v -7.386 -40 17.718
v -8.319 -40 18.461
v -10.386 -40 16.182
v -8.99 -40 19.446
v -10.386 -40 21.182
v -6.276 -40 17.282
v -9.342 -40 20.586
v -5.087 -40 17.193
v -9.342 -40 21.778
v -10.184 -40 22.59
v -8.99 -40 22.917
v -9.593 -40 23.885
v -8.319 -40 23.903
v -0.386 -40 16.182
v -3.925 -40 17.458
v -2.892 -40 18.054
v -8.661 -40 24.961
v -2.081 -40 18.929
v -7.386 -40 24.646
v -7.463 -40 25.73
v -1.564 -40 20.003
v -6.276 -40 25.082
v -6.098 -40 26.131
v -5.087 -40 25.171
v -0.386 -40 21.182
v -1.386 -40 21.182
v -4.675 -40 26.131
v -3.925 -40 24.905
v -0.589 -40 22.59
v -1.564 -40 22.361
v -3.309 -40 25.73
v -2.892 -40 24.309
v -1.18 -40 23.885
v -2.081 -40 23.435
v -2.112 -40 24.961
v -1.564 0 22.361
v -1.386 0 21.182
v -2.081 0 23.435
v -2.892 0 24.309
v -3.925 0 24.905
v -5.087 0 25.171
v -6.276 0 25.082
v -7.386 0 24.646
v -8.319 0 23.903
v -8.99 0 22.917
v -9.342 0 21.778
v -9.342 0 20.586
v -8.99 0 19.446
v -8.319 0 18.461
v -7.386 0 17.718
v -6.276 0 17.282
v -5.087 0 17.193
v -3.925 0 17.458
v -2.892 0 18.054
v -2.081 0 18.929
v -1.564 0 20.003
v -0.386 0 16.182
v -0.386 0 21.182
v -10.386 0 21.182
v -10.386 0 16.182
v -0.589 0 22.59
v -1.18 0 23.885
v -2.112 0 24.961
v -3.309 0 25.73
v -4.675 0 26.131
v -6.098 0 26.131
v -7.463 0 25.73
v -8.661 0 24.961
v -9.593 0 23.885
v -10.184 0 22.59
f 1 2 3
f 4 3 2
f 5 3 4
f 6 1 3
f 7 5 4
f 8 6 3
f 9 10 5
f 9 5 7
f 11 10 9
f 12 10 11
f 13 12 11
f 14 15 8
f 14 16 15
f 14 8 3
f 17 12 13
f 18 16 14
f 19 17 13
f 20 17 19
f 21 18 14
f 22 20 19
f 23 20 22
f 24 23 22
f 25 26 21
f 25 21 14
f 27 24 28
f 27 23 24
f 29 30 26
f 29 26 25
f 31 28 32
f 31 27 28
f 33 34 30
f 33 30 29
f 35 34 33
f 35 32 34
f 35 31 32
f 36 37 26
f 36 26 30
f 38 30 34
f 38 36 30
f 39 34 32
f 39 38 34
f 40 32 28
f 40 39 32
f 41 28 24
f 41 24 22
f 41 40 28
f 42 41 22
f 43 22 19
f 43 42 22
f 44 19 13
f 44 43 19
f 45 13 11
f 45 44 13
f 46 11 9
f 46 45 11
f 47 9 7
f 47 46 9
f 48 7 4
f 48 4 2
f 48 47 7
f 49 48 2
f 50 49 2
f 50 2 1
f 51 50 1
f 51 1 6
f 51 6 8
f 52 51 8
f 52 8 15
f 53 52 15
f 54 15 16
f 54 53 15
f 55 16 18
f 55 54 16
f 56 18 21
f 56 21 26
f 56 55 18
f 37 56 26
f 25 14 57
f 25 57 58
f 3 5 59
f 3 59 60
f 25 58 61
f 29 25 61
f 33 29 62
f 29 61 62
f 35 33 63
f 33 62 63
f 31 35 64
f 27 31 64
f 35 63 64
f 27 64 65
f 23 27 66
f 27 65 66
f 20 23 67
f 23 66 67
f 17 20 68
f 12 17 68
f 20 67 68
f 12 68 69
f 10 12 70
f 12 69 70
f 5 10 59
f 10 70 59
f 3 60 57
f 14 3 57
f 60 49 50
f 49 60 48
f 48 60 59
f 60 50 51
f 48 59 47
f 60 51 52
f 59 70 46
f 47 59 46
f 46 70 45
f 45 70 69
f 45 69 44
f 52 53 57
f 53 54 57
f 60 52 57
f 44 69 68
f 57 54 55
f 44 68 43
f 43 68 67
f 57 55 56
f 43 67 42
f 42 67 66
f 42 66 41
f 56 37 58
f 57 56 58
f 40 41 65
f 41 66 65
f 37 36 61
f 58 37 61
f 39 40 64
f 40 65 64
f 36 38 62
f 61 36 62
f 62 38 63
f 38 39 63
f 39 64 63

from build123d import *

# Parameters (mm, degrees)
F0_R     = 4
F1_DEPTH = 40


with BuildPart() as f1:
    # F0 (on Front) → F1 (new body)
    with BuildSketch(Plane.XZ):
        with BuildLine():
            ThreePointArc((-5.386362, 16.181819), (-8.921896, 17.646285), (-10.386362, 21.181819))
            Line((-10.386362, 21.181819), (-10.386362, 16.181819))
            Line((-10.386362, 16.181819), (-5.386362, 16.181819))
        make_face()
        with BuildLine():
            ThreePointArc((-5.386362, 16.181819), (-1.850828, 17.646285), (-0.386362, 21.181819))
            ThreePointArc((-0.386362, 21.181819), (-5.386362, 26.181819), (-10.386362, 21.181819))
            ThreePointArc((-10.386362, 21.181819), (-8.921896, 17.646285), (-5.386362, 16.181819))
        make_face()
        with Locations((-5.386362, 21.181819)):
            Circle(F0_R, mode=Mode.SUBTRACT)
        with BuildLine():
            Line((-0.386362, 16.181819), (-0.386362, 21.181819))
            ThreePointArc((-0.386362, 21.181819), (-1.850828, 17.646285), (-5.386362, 16.181819))
            Line((-5.386362, 16.181819), (-0.386362, 16.181819))
        make_face()
    extrude(amount=F1_DEPTH)


solid = f1.part
